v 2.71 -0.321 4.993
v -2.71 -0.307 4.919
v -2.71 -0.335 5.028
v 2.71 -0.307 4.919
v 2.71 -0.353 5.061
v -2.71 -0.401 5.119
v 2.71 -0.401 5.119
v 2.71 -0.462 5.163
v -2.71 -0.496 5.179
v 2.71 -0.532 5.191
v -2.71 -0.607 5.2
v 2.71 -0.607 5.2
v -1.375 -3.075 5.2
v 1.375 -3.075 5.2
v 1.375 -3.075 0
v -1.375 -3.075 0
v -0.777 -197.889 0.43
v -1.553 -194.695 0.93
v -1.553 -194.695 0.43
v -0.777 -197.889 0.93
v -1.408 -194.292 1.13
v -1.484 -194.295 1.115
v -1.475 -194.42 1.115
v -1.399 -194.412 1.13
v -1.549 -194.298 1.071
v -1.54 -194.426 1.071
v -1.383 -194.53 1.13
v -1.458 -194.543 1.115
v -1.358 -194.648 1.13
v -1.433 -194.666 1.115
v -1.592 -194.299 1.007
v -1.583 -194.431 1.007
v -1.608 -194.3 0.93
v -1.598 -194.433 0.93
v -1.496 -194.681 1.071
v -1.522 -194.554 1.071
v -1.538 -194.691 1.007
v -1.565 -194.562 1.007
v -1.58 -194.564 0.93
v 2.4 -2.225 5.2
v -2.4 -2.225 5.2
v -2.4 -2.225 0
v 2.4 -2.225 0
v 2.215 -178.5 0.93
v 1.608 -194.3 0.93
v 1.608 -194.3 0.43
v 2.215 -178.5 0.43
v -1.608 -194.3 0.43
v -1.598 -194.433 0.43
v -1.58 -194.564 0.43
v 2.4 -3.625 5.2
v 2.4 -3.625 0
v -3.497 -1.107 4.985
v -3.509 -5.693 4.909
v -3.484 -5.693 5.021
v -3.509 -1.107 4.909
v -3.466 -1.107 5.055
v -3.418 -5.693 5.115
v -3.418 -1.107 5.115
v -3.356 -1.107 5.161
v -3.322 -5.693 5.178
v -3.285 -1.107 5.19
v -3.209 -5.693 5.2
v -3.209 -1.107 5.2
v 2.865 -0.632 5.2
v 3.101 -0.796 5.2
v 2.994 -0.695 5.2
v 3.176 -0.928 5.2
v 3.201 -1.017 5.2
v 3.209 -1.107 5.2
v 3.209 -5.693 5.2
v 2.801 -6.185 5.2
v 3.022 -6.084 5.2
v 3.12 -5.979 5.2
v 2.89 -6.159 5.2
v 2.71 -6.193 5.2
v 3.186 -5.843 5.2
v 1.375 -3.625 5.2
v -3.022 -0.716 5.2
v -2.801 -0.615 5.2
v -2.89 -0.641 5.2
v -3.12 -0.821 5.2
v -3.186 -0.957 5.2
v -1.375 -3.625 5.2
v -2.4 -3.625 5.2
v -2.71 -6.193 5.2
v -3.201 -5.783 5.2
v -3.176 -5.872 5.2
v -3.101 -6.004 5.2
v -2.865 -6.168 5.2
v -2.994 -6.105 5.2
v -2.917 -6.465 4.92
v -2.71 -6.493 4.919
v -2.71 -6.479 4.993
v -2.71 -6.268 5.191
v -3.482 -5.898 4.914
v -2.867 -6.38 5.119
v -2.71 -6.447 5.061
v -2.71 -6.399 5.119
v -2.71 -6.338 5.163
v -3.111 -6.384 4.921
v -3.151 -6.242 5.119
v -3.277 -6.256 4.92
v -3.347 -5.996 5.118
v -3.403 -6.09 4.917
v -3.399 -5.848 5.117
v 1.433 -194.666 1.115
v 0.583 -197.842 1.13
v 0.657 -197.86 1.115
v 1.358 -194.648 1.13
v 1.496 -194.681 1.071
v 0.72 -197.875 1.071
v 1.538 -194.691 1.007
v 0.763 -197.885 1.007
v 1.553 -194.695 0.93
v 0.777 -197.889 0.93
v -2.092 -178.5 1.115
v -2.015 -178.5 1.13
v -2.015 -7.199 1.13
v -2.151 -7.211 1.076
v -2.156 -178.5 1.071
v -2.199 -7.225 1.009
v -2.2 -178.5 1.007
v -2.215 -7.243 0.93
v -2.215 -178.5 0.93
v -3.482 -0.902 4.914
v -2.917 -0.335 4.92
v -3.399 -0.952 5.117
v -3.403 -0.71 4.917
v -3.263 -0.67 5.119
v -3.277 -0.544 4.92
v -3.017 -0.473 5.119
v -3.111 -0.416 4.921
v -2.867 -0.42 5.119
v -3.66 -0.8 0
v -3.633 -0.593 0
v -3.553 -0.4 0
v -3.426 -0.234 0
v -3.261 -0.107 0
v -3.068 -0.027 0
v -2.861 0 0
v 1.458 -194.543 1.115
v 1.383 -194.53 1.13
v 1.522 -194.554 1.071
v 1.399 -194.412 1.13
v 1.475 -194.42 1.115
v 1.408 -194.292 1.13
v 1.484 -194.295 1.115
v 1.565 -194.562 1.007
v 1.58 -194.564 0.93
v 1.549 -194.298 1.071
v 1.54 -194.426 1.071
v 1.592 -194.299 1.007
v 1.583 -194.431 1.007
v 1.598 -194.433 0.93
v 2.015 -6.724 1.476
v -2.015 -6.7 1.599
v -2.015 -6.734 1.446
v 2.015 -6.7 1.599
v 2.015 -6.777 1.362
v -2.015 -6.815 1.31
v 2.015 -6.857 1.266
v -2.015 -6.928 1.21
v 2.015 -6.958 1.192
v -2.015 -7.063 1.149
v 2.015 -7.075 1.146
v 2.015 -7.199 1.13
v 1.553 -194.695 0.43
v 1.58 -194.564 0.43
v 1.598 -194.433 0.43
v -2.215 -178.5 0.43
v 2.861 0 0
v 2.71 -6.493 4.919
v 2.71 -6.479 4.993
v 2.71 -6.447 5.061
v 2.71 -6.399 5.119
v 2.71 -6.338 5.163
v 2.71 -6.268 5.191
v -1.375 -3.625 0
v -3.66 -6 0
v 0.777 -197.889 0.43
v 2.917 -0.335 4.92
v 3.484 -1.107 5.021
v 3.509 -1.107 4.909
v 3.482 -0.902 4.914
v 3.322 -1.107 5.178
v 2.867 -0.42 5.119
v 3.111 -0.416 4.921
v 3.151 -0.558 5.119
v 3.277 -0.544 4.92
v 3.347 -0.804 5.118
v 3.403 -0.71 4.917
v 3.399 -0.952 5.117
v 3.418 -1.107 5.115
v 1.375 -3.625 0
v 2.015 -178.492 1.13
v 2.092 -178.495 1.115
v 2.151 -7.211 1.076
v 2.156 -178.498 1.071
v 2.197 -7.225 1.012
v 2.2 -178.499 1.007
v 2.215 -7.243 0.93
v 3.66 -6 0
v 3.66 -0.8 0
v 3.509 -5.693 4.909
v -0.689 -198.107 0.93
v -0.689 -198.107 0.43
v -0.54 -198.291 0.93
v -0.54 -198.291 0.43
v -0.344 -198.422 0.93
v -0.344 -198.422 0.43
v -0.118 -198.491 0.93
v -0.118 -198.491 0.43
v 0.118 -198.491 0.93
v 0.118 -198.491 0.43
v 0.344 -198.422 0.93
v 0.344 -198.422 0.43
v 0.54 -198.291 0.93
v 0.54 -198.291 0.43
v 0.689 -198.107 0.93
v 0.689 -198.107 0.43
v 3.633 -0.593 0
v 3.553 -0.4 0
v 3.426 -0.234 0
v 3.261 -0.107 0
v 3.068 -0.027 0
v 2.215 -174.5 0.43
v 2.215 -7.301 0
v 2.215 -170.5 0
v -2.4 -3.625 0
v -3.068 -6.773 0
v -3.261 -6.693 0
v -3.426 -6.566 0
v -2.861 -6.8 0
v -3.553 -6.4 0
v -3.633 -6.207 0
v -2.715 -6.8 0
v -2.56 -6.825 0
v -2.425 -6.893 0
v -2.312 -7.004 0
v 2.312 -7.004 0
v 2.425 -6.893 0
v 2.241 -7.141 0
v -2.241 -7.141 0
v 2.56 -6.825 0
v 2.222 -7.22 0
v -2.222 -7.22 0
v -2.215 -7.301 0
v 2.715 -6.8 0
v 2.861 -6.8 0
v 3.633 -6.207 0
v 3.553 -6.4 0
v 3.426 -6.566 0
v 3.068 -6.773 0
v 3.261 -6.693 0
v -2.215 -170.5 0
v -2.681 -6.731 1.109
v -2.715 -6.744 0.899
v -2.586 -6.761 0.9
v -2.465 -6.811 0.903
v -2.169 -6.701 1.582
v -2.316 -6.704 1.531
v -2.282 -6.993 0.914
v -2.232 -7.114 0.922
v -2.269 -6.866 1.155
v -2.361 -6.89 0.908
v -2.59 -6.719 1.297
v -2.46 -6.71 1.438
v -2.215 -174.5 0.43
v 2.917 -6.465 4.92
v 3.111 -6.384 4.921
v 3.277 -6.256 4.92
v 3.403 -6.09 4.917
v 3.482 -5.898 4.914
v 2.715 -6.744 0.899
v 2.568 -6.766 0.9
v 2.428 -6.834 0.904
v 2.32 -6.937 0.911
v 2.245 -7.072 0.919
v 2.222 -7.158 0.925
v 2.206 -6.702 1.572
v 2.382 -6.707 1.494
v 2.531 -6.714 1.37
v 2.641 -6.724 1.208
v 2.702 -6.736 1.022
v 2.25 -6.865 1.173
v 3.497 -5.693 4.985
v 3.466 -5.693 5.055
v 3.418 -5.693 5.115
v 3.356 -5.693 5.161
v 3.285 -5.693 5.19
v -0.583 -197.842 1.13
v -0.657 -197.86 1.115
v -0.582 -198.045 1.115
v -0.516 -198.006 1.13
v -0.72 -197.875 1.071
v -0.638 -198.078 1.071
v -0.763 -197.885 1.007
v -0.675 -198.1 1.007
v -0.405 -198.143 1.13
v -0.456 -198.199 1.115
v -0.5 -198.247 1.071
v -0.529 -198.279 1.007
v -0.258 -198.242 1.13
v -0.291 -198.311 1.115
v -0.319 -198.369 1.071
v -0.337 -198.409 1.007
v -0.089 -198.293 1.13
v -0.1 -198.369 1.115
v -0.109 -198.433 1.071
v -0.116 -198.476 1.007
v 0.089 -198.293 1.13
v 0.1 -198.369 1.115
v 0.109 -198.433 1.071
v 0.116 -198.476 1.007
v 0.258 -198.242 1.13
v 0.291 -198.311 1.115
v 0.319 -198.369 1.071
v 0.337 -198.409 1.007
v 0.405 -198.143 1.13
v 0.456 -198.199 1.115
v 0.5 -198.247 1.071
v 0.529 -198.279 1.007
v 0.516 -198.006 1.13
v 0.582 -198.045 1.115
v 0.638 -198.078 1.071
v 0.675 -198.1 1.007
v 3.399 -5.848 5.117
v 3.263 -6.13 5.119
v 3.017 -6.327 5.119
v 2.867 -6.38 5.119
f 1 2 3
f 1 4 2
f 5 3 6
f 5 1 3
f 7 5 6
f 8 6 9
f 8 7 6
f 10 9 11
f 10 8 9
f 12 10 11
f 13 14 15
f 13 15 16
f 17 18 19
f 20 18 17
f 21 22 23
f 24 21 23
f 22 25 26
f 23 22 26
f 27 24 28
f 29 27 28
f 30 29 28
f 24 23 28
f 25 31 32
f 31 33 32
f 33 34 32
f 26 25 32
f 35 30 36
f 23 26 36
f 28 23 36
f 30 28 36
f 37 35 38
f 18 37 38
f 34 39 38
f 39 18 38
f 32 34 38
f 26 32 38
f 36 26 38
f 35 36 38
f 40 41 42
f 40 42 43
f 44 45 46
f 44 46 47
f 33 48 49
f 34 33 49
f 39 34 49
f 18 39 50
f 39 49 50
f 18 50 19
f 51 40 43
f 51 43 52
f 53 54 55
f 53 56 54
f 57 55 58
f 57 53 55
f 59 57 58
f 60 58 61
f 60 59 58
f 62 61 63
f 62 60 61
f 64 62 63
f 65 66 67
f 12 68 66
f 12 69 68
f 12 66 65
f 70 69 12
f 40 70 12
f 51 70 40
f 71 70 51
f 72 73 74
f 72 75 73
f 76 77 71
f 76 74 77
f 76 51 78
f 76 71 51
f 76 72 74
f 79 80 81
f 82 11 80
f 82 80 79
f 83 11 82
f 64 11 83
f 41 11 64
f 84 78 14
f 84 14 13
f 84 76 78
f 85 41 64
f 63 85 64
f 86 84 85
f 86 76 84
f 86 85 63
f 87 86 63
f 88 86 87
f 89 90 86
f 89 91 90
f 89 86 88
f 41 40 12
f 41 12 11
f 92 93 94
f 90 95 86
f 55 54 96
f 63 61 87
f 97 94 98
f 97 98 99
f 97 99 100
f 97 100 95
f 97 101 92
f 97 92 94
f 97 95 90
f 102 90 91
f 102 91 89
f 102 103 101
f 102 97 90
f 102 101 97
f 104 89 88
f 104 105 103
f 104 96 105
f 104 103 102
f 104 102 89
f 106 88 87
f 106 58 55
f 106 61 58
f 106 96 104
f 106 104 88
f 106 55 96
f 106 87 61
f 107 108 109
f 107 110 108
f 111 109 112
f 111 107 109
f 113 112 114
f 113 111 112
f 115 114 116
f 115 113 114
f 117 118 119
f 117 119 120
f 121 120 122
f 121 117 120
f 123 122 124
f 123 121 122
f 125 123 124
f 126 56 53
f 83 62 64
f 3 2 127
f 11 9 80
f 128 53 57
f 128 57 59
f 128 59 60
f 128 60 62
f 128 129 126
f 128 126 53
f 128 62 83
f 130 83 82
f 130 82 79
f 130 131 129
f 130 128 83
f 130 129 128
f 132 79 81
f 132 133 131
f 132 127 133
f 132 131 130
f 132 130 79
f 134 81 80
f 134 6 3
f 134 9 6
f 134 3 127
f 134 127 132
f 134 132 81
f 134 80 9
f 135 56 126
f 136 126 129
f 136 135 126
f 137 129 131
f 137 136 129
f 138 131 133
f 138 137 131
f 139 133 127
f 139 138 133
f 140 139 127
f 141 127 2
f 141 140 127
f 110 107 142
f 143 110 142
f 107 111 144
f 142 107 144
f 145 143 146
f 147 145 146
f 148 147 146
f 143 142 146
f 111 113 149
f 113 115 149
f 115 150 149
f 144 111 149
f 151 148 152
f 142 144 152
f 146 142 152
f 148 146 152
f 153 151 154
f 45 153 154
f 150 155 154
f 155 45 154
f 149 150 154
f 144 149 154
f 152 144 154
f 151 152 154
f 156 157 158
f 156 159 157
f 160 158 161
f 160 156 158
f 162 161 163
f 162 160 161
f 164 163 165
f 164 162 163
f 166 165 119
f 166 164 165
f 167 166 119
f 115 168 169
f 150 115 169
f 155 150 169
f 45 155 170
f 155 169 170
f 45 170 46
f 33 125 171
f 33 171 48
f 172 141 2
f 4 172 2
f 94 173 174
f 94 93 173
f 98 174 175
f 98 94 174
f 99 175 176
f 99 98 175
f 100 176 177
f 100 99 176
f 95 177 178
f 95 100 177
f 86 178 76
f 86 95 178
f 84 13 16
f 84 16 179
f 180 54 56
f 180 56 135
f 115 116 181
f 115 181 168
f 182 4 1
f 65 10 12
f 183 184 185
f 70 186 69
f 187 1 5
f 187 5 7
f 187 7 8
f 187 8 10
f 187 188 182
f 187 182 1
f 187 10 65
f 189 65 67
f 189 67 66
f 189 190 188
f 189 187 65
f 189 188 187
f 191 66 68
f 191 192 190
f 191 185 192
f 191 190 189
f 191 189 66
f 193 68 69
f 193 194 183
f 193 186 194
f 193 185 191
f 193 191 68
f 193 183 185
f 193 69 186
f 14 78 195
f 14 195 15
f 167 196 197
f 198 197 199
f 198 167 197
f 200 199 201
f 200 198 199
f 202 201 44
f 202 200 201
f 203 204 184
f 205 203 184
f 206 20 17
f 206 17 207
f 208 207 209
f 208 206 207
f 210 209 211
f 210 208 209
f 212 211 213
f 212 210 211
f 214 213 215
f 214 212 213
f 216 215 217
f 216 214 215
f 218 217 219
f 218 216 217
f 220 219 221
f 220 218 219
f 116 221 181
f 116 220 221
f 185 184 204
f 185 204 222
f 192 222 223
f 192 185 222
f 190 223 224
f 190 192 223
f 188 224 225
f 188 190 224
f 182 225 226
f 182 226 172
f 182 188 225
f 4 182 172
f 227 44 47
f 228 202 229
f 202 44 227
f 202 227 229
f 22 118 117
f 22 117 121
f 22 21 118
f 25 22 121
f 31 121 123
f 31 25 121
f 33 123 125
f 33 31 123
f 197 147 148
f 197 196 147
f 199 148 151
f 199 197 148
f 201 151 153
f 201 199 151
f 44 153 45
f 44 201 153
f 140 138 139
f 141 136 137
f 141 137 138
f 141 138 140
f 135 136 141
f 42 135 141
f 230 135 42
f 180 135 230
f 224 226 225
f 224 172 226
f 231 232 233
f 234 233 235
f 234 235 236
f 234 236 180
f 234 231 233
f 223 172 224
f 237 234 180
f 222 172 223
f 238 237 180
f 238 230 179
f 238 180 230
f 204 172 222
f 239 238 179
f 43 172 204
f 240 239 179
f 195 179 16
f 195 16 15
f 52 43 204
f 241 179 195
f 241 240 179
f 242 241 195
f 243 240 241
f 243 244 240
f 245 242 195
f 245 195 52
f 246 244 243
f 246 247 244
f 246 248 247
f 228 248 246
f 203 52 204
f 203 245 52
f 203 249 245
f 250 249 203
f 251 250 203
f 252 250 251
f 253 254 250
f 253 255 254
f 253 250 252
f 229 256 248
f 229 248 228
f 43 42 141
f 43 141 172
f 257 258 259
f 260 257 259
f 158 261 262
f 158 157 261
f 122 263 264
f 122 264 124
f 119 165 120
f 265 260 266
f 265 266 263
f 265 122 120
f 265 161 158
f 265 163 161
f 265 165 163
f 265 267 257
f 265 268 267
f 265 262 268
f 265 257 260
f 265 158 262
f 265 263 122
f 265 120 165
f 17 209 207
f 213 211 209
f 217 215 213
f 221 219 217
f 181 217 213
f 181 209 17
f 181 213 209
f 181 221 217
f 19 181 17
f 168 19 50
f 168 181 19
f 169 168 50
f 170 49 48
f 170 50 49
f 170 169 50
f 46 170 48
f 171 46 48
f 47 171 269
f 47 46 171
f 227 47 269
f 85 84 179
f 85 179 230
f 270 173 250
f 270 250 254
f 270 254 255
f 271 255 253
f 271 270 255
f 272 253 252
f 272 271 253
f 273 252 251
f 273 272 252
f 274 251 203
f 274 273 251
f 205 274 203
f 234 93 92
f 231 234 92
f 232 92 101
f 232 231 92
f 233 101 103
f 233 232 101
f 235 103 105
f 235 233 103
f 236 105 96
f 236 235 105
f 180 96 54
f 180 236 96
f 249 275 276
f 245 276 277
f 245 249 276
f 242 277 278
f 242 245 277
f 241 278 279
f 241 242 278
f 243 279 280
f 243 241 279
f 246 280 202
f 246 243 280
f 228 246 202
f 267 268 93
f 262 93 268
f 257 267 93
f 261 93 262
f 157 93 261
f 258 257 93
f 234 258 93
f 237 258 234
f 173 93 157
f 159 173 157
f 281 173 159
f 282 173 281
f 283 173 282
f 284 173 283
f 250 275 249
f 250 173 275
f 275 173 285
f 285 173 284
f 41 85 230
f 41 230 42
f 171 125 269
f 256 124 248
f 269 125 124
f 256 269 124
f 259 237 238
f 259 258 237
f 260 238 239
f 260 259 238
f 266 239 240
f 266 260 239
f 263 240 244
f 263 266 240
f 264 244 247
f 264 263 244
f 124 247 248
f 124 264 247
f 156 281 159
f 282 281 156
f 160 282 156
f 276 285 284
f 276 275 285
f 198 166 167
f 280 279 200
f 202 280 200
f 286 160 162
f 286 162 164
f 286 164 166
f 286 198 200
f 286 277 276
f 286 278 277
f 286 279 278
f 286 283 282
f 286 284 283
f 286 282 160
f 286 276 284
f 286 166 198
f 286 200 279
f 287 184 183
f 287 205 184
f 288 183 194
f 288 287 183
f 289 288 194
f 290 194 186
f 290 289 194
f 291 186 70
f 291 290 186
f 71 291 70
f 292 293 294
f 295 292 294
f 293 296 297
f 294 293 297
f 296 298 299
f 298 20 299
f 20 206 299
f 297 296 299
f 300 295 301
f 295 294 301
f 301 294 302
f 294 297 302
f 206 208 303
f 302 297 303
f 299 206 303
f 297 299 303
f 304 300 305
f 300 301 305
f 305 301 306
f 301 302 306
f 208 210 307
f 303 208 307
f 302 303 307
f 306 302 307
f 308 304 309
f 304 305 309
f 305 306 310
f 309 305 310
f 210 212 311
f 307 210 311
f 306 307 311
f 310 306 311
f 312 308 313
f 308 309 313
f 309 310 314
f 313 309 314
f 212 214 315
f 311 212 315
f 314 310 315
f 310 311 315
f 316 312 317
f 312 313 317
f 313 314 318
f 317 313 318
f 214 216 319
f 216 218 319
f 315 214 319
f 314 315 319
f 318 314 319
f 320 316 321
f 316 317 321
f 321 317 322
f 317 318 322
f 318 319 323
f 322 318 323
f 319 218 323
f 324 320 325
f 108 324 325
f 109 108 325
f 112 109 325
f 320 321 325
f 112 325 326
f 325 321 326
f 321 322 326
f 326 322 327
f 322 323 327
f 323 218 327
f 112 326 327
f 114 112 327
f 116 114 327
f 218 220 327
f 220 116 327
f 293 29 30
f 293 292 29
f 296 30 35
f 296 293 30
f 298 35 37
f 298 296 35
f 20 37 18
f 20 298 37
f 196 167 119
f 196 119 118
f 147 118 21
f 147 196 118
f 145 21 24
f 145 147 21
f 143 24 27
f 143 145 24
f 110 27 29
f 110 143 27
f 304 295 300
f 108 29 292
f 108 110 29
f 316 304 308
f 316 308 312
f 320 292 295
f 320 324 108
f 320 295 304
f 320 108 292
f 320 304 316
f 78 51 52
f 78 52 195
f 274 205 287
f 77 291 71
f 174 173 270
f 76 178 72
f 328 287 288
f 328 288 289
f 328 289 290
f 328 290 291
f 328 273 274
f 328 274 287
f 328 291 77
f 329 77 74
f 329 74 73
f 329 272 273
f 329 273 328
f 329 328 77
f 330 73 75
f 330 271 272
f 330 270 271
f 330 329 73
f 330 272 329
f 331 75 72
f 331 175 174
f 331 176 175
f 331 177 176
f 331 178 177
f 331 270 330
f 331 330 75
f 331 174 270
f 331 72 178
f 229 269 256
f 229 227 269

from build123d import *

# Parameters (mm, degrees)
BOSS_EXTRUDE1_DEPTH             = 2.215
BOSS_EXTRUDE3_REACH             = 201.5
BOSS_EXTRUDE3_START             = -1
BOSS_EXTRUDE3_DIRECTION_2_REACH = 3
CUT_EXTRUDE1_DEPTH              = 5.2
CUT_EXTRUDE2_DEPTH              = 0.7
FILLET1_R                       = 2
FILLET2_R                       = 0.8
FILLET4_R                       = 0.2
FILLET3_R                       = 0.5
FILLET5_R                       = 0.3


with BuildPart() as part:
    # Sketch1 → Boss-Extrude1 (new body, symmetric)
    with BuildSketch(Plane(origin=(0, 0, 0), x_dir=(0, 0, -1), z_dir=(1, 0, 0))):
        Polygon((0, 0), (-5.2, -0.325), (-5.2, -6.475), (-1.13, -6.729375), (-1.13, -198.5), (-0.43, -198.5), (-0.43, -174.5), (0, -170.5), align=None)
    extrude(amount=BOSS_EXTRUDE1_DEPTH, both=True)

    # Boss-Extrude3: up to this face of the body (flat: up to its plane)
    boss_extrude3_end = Plane(part.part.faces().sort_by_distance((0, -6.6021875, 3.165))[0])
    # Sketch2 → Boss-Extrude3 (add, up to the picked face)
    with BuildSketch(Plane(origin=(0, 0, 0), x_dir=(1, 0, 0), z_dir=(0, 1, 0)).offset(BOSS_EXTRUDE3_START), mode=Mode.PRIVATE) as boss_extrude3_sk1:
        Polygon((-3.66, 0), (3.66, 0), (3.5, -5.2), (-3.5, -5.2), align=None)
    boss_extrude3_tool1 = split(extrude(boss_extrude3_sk1.sketch, amount=-BOSS_EXTRUDE3_REACH, mode=Mode.PRIVATE), bisect_by=boss_extrude3_end, keep=Keep.BOTH, mode=Mode.PRIVATE)
    add(boss_extrude3_tool1.solids().sort_by_distance((0, -1, 2.580633))[0])

    # Boss-Extrude3 direction 2: up to this face of the body (flat: up to its plane)
    boss_extrude3_direction_2_end = Plane(part.part.faces().sort_by_distance((0, -0.1625, 2.6))[0])
    # Sketch2 → Boss-Extrude3 direction 2 (add, up to the picked face)
    with BuildSketch(Plane(origin=(0, 0, 0), x_dir=(1, 0, 0), z_dir=(0, 1, 0)).offset(BOSS_EXTRUDE3_START), mode=Mode.PRIVATE) as boss_extrude3_direction_2_sk1:
        Polygon((-3.66, 0), (3.66, 0), (3.5, -5.2), (-3.5, -5.2), align=None)
    boss_extrude3_direction_2_tool1 = split(extrude(boss_extrude3_direction_2_sk1.sketch, amount=BOSS_EXTRUDE3_DIRECTION_2_REACH, mode=Mode.PRIVATE), bisect_by=boss_extrude3_direction_2_end, keep=Keep.BOTH, mode=Mode.PRIVATE)
    add(boss_extrude3_direction_2_tool1.solids().sort_by_distance((0, -1, 2.580633))[0])

    # Sketch3 → Cut-Extrude1 (cut)
    with BuildSketch(Plane.XY.offset(5.2)):
        Polygon((-2.4, -2.225), (2.4, -2.225), (2.4, -3.625), (1.375, -3.625), (1.375, -3.075), (-1.375, -3.075), (-1.375, -3.625), (-2.4, -3.625), align=None)
    extrude(amount=-CUT_EXTRUDE1_DEPTH, mode=Mode.SUBTRACT)

    # Sketch5 → Cut-Extrude2 (cut)
    with BuildSketch(Plane.XY.offset(1.13)):
        with BuildLine():
            Line((0.777423831, -197.888711915), (1.6, -194.5))
            Line((1.6, -194.5), (2.215, -178.5))
            Line((2.215, -178.5), (2.215, -198.6))
            Line((2.215, -198.6), (-2.215, -198.6))
            Line((-2.215, -198.6), (-2.215, -178.5))
            Line((-2.215, -178.5), (-1.6, -194.5))
            Line((-1.6, -194.5), (-0.777423831, -197.888711915))
            ThreePointArc((-0.777423831, -197.888711915), (0, -198.5), (0.777423831, -197.888711915))
        make_face()
    extrude(amount=-CUT_EXTRUDE2_DEPTH, mode=Mode.SUBTRACT)

    # Fillet1
    fillet1_edges = [part.edges().sort_by_distance(p)[0] for p in [
        (2.215, -178.5, 0.78),
        (1.6, -194.5, 0.78),
        (-2.215, -178.5, 0.78),
        (-1.6, -194.5, 0.78),
    ]]
    fillet(fillet1_edges, radius=FILLET1_R)

    # Fillet2
    fillet2_edges = [part.edges().sort_by_distance(p)[0] for p in [
        (3.58, -0.1625, 2.6),
        (3.58, -6.6375, 2.6),
        (-3.58, -0.1625, 2.6),
        (-3.58, -6.6375, 2.6),
    ]]
    fillet(fillet2_edges, radius=FILLET2_R)

    # Fillet4
    fillet4_edges = [part.edges().sort_by_distance(p)[0] for p in [
        (1.165077859, -196.291719596, 1.13),
        (1.911348252, -186.399882881, 1.13),
        (-1.911348252, -186.399882881, 1.13),
        (1.590082395, -194.498619822, 1.13),
        (-1.590082395, -194.498619822, 1.13),
        (1.911348252, -186.399882881, 1.13),
        (-1.911348252, -186.399882881, 1.13),
        (2.215, -92.6146875, 1.13),
        (0, -198.5, 1.13),
        (-1.165077859, -196.291719596, 1.13),
        (-2.215, -92.6146875, 1.13),
    ]]
    fillet(fillet4_edges, radius=FILLET4_R)

    # Fillet3
    fillet3_edges = [part.edges().sort_by_distance(p)[0] for p in [
        (0, -6.729375, 1.13),
        (-2.215, -6.7709375, 0.465),
        (2.215, -6.7709375, 0.465),
        (-2.156490258, -6.733040474, 1.071352421),
        (2.156490258, -6.733040474, 1.071352421),
    ]]
    fillet(fillet3_edges, radius=FILLET3_R)

    # Fillet5
    fillet5_edges = [part.edges().sort_by_distance(p)[0] for p in [
        (0, -6.475, 5.2),
        (-3.5, -3.4, 5.2),
        (0, -0.325, 5.2),
        (3.5, -3.4, 5.2),
        (3.266325663, -6.240562729, 5.2),
        (3.266325663, -0.559437271, 5.2),
        (-3.266325663, -0.559437271, 5.2),
        (-3.266325663, -6.240562729, 5.2),
    ]]
    fillet(fillet5_edges, radius=FILLET5_R)


solid = part.part
